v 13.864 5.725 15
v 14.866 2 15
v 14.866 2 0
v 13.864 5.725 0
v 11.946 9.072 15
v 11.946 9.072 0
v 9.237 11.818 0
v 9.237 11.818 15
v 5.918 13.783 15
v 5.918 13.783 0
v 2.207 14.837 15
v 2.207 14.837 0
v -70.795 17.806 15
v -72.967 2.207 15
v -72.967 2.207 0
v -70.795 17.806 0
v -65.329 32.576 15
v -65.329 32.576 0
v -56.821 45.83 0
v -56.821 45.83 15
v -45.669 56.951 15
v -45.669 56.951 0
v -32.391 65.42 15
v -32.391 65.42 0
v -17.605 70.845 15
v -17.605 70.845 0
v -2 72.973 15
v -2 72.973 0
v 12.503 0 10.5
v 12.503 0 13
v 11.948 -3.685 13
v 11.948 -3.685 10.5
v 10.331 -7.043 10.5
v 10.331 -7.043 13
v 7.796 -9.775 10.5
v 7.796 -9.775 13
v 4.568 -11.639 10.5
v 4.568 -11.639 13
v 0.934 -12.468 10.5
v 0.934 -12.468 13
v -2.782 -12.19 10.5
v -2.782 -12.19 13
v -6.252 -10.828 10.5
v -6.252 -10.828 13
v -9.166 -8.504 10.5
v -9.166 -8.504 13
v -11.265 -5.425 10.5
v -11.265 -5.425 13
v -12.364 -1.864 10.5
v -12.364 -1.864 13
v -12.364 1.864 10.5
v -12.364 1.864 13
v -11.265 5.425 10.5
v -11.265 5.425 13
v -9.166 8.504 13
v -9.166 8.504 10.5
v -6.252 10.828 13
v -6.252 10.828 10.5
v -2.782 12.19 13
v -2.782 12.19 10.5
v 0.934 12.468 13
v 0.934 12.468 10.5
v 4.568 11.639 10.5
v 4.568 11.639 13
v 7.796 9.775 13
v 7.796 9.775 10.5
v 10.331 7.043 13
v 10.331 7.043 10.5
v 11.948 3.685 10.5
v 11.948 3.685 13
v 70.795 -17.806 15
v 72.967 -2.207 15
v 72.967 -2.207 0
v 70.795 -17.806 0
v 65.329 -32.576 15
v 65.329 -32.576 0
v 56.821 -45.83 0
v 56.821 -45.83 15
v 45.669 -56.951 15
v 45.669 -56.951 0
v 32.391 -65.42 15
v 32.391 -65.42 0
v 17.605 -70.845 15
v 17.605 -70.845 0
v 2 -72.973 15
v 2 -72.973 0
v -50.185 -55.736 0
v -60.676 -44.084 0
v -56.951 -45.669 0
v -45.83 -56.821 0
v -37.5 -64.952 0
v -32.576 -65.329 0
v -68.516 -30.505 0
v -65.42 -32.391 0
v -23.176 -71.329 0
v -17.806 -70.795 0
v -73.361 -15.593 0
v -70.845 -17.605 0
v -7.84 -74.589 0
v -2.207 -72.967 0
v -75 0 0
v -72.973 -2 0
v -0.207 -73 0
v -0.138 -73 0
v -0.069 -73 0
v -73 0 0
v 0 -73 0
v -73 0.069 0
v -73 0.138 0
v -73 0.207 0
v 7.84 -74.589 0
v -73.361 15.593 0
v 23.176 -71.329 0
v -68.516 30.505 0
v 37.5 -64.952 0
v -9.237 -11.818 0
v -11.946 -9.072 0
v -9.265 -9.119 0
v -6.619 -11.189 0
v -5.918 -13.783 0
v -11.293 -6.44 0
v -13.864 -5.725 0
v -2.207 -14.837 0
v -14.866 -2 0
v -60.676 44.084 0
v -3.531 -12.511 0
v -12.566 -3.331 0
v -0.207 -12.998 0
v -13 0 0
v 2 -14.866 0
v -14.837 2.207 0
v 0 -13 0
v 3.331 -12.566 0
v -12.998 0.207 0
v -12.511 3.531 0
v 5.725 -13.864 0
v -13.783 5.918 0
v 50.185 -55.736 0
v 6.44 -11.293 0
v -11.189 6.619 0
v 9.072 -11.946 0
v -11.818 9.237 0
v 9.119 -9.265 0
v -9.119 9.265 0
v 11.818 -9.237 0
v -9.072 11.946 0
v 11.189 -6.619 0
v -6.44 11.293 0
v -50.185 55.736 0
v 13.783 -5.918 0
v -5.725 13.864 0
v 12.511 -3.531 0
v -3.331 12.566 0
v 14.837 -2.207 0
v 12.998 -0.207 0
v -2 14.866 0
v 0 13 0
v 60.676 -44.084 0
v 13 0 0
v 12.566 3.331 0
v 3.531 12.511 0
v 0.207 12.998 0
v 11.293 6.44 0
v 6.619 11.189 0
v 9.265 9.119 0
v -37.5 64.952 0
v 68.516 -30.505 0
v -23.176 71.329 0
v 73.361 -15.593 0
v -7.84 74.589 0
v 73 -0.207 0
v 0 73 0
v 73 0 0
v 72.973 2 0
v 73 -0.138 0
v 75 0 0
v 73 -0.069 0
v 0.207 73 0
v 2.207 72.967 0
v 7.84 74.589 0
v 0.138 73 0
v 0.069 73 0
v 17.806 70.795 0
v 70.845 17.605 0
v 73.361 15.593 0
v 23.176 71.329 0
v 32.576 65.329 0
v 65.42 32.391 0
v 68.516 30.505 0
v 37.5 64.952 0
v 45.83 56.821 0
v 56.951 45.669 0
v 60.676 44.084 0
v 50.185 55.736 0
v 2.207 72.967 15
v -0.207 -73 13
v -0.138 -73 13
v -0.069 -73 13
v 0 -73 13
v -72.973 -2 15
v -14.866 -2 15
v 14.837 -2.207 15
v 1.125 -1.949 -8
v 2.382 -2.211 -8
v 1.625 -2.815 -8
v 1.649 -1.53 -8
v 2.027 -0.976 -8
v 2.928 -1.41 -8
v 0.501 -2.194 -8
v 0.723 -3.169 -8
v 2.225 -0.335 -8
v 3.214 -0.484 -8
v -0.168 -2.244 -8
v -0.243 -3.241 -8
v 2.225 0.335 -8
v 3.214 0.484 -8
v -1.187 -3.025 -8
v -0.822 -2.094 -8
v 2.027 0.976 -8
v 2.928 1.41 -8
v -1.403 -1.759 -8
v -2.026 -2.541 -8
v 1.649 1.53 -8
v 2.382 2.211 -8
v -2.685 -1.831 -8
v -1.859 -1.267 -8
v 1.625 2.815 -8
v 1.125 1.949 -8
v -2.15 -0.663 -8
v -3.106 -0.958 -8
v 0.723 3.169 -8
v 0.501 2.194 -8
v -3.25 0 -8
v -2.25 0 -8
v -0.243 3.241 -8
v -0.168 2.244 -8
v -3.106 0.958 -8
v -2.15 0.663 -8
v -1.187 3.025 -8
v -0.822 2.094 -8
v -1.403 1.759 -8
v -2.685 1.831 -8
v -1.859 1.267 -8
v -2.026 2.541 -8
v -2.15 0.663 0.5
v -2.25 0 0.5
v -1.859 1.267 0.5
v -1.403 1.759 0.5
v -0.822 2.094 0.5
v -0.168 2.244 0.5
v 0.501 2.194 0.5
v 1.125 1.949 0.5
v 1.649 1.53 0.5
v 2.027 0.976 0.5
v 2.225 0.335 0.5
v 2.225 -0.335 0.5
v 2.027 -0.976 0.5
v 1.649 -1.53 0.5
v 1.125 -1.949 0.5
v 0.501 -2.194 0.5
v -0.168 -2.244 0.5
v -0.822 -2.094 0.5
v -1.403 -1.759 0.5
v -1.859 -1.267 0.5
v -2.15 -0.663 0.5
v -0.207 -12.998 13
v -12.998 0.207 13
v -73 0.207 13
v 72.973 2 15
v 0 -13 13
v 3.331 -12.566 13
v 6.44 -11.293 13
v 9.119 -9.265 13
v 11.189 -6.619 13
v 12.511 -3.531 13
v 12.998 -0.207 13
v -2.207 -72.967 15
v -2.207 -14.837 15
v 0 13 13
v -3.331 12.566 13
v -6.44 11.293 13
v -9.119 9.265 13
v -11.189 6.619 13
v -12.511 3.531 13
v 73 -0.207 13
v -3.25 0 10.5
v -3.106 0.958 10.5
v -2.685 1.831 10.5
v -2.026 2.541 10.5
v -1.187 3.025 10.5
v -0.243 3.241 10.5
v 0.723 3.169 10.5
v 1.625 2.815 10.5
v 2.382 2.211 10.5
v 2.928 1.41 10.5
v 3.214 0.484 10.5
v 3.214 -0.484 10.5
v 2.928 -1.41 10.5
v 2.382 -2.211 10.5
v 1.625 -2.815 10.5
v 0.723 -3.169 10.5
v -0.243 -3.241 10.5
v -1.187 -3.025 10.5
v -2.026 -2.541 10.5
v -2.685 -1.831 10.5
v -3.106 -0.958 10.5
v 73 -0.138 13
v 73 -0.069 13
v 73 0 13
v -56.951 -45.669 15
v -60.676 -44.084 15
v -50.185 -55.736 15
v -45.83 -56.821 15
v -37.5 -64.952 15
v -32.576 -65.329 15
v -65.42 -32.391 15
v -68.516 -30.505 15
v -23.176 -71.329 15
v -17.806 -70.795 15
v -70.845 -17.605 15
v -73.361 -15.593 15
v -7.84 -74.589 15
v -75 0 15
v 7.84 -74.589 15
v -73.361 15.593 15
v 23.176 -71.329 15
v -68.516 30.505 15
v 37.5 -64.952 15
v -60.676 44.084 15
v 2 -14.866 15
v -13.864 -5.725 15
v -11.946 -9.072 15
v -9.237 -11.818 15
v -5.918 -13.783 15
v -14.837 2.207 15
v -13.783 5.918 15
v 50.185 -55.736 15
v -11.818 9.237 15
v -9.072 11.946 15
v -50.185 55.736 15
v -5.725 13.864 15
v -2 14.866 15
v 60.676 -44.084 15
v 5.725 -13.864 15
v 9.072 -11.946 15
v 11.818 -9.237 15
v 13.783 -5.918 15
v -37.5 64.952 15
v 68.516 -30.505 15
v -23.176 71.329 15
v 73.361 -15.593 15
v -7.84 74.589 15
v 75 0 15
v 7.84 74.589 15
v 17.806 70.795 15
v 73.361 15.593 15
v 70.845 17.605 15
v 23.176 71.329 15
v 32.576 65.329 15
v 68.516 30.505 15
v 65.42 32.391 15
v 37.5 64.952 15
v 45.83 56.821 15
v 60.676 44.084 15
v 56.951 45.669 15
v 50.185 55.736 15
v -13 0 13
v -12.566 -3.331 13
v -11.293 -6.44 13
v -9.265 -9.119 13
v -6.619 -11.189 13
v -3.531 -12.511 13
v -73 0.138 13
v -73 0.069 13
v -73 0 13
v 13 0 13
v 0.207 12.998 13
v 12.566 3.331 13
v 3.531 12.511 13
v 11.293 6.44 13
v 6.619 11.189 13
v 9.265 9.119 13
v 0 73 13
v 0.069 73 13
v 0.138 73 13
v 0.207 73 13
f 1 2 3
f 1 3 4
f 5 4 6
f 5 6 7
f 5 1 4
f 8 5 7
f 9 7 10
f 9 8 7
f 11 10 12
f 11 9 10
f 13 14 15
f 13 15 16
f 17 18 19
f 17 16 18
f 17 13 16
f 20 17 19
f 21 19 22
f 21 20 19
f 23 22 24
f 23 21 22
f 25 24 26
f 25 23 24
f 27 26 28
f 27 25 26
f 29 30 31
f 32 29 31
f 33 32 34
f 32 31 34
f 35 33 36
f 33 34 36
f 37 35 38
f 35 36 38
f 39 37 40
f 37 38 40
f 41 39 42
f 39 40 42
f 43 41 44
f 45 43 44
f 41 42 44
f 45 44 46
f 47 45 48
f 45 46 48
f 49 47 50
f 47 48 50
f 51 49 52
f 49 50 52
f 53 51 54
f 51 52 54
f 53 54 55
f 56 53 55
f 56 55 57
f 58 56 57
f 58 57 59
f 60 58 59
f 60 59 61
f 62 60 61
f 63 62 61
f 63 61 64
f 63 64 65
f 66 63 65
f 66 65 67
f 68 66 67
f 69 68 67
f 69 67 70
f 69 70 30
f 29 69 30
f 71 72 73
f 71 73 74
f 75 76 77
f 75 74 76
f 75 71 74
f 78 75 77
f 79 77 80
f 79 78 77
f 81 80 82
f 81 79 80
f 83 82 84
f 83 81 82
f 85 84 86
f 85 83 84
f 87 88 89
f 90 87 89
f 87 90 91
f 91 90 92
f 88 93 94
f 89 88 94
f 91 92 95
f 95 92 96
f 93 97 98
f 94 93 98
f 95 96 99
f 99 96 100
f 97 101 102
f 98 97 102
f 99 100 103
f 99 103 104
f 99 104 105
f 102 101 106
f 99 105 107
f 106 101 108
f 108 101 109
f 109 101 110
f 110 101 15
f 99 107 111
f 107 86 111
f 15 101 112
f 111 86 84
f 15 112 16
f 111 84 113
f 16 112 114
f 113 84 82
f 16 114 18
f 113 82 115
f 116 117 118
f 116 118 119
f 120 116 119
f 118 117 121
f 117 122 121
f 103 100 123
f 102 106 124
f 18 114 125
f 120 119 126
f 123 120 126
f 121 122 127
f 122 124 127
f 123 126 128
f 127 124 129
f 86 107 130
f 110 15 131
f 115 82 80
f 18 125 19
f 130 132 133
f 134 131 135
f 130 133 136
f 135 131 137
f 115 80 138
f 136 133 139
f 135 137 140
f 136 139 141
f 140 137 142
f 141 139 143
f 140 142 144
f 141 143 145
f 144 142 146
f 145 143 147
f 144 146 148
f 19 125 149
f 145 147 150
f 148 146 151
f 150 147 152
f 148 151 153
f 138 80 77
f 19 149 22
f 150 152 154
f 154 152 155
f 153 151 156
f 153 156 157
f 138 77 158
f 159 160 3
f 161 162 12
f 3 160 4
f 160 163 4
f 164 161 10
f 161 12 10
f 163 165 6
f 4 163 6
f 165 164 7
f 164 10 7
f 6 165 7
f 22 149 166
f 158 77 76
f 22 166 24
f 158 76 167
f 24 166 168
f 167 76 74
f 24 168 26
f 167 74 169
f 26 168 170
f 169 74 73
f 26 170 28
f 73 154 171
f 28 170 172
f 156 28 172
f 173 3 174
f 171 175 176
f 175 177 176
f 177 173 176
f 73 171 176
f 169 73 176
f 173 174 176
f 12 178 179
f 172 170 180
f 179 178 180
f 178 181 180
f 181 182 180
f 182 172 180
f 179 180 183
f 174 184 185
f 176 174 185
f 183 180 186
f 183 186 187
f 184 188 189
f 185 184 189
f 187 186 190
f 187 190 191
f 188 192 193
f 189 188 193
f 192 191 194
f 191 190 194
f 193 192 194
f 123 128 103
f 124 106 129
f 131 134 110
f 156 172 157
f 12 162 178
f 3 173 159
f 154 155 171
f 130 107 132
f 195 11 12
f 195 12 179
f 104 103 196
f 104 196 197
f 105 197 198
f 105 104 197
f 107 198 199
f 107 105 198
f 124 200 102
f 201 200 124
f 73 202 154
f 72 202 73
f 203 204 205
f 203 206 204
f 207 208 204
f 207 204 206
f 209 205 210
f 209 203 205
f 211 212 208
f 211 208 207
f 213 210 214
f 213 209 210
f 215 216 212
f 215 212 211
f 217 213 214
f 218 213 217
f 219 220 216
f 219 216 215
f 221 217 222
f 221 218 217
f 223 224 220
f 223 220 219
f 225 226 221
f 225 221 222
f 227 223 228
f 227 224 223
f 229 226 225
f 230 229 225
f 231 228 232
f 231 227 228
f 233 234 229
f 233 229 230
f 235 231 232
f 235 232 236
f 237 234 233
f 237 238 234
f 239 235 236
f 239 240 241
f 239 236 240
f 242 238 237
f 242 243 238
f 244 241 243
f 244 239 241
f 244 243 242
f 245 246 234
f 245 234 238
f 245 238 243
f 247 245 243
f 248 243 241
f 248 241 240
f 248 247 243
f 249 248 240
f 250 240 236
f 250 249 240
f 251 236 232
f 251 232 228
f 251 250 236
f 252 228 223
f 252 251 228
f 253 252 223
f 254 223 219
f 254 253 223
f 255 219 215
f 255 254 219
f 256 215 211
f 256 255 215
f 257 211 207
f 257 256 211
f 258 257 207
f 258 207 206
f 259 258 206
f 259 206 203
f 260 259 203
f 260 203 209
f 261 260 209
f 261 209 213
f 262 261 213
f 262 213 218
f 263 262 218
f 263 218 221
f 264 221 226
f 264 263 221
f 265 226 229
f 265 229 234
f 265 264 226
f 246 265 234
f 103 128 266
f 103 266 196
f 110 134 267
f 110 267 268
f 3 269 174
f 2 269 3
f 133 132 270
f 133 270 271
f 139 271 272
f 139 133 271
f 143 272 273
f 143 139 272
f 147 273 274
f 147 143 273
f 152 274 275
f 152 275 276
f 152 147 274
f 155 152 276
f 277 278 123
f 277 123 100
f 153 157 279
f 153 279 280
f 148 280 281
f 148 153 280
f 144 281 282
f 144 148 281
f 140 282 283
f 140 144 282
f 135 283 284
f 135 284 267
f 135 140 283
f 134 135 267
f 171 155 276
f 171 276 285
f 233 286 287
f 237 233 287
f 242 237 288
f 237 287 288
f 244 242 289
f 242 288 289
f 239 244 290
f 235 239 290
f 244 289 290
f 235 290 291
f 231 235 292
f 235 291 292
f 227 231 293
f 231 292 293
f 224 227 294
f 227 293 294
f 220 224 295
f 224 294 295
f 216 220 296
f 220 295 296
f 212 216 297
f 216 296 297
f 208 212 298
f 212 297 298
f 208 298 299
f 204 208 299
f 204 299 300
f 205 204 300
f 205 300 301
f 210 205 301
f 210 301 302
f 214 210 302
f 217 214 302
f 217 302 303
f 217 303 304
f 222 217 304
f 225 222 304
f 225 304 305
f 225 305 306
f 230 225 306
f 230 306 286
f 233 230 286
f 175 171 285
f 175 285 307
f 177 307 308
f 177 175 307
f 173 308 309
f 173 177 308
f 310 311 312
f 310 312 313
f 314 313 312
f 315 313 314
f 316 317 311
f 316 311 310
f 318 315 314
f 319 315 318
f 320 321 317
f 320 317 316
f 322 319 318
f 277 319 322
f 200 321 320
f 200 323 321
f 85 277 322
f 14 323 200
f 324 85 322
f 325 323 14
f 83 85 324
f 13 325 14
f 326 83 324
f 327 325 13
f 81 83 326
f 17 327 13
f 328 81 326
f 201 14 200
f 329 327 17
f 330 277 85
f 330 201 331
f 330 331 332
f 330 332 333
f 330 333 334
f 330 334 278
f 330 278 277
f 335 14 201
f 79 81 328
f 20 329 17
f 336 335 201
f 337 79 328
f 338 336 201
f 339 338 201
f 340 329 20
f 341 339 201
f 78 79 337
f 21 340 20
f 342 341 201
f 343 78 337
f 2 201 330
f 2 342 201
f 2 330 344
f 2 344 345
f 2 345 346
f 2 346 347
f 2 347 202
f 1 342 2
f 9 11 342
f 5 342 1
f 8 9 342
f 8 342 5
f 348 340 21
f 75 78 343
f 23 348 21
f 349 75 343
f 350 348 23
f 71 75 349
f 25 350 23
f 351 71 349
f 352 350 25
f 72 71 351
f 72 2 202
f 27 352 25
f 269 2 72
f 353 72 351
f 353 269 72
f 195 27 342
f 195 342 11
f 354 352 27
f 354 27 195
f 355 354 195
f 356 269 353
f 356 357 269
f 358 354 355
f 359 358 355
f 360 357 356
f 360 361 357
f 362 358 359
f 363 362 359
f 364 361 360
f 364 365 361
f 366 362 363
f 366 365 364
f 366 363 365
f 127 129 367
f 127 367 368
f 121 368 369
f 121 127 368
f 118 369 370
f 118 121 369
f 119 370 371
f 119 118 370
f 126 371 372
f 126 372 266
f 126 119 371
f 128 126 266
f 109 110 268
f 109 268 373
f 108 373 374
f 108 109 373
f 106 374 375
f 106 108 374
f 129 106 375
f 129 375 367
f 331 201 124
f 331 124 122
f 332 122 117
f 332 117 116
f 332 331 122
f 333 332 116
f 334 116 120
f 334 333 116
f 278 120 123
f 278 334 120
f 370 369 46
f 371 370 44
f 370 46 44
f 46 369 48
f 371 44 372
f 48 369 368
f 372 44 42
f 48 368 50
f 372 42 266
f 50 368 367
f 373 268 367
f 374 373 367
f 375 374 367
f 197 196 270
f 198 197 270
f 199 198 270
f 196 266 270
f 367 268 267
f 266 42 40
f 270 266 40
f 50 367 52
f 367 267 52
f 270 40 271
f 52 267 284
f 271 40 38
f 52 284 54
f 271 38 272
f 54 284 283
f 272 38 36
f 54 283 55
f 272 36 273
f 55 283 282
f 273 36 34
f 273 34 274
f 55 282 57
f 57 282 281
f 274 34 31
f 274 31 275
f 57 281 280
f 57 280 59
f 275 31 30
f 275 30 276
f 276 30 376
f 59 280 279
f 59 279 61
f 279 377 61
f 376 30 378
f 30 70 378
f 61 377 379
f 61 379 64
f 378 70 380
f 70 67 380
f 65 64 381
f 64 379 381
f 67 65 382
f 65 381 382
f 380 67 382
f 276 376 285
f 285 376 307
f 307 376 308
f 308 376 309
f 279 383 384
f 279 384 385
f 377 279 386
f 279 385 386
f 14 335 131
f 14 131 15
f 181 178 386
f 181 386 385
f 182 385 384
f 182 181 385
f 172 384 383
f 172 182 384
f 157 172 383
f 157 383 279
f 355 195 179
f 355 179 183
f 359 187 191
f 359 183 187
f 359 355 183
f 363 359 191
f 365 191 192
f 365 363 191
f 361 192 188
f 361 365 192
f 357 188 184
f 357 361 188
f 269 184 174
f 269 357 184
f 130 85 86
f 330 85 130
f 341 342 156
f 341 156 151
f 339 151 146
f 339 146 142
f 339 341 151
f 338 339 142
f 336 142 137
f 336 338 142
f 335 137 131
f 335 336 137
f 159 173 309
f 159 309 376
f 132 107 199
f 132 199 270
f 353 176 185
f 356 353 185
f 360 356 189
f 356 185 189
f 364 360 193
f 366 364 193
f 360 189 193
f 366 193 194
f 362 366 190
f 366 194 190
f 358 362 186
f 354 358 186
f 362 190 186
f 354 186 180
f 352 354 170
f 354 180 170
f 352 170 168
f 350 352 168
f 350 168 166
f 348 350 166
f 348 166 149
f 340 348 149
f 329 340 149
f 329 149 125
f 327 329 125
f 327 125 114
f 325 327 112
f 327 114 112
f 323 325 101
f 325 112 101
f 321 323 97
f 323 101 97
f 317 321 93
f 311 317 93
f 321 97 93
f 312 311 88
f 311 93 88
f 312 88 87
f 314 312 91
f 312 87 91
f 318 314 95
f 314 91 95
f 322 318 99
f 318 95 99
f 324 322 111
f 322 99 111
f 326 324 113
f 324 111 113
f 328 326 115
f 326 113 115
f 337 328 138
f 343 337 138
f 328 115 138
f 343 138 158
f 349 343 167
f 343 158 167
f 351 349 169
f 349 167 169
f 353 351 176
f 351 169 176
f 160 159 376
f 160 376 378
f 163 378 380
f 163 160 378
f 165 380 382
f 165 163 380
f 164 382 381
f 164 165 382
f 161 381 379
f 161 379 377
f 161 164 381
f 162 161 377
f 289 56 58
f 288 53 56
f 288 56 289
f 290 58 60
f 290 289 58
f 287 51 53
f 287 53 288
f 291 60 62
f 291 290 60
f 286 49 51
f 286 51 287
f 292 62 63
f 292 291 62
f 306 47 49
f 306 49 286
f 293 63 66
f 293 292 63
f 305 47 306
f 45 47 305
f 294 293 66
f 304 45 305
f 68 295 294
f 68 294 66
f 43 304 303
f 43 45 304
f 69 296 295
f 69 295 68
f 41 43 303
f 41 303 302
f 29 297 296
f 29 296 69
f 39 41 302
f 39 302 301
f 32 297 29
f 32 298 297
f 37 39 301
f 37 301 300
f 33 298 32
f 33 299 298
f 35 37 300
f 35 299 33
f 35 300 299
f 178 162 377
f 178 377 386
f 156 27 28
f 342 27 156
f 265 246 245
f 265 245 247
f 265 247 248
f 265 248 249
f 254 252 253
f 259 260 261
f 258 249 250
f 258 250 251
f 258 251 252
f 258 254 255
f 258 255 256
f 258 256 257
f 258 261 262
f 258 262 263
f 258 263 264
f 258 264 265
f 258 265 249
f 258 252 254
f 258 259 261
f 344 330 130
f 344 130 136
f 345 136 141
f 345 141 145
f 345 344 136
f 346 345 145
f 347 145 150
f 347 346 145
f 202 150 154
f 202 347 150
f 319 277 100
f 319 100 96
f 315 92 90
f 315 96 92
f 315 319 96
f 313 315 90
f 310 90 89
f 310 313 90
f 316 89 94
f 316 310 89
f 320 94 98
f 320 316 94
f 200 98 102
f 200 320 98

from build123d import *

# Parameters (mm, degrees)
SKETCH4_R           = 75
BOSS_EXTRUDE2_DEPTH = 15
CUT_EXTRUDE1_DEPTH  = 108.121426428
CIRPATTERN1_COUNT   = 4
SHELL1_DEPTH        = 13
SKETCH7_R           = 12.503328754
BOSS_EXTRUDE3_DEPTH = 12.5
SKETCH8_R           = 3.25
SKETCH8_R_2         = 2.25
BOSS_EXTRUDE4_DEPTH = 8.5
CUT_EXTRUDE2_START  = -10
SKETCH9_R           = 12.503328754
SKETCH9_R_2         = 3.25
CUT_EXTRUDE2_DEPTH  = 10


# Read off the part's stored shape, not the designer's step: Shell1
with BuildPart() as part:
    # Sketch4 → Boss-Extrude2 (new body)
    with BuildSketch(Plane.XY):
        Circle(SKETCH4_R)
    extrude(amount=BOSS_EXTRUDE2_DEPTH)

    # Sketch6 → Cut-Extrude1 (cut, symmetric)
    with BuildSketch(Plane.XY):
        with BuildLine():
            Line((2.206615595, 15), (2.206615595, 69.72932719))
            Line((2.206615595, 69.72932719), (2.206615595, 72.96664202))
            ThreePointArc((2.206615595, 72.96664202), (51.691823279, 51.54566331), (72.972597597, 2))
            Line((72.972597597, 2), (15, 2))
            Line((15, 2), (14.866068747, 2))
            ThreePointArc((14.866068747, 2), (10.680123706, 10.532566526), (2.206615595, 14.836807191))
            Line((2.206615595, 14.836807191), (2.206615595, 15))
        make_face()
    cut_extrude1 = extrude(amount=CUT_EXTRUDE1_DEPTH, both=True, mode=Mode.SUBTRACT)

    # CirPattern1: Cut-Extrude1 ×4 about axis
    cirpattern1_axis = Axis((0, 0, 0), (0, 0, 1))
    for i in range(1, CIRPATTERN1_COUNT):
        add(cut_extrude1.rotate(cirpattern1_axis, i * 360 / CIRPATTERN1_COUNT), mode=Mode.SUBTRACT)

    # Shell1 outline → Shell1 (cut)
    with BuildSketch(Plane.XY):
        with BuildLine():
            ThreePointArc((-0.206615595, -72.999707602), (-0.103307901, -72.9999269), (0, -73))
            Line((0, -73), (0, -13))
            ThreePointArc((0, -13), (9.119045928, -9.26514983), (12.998357973, -0.206615595))
            Line((12.998357973, -0.206615595), (72.999707602, -0.206615595))
            ThreePointArc((72.999707602, -0.206615595), (72.9999269, -0.103307901), (73, 0))
            Line((73, 0), (13, 0))
            ThreePointArc((13, 0), (9.26514983, 9.119045928), (0.206615595, 12.998357973))
            Line((0.206615595, 12.998357973), (0.206615595, 72.999707602))
            ThreePointArc((0.206615595, 72.999707602), (0.103307901, 72.9999269), (0, 73))
            Line((0, 73), (0, 13))
            ThreePointArc((0, 13), (-9.119045928, 9.26514983), (-12.998357973, 0.206615595))
            Line((-12.998357973, 0.206615595), (-72.999707602, 0.206615595))
            ThreePointArc((-72.999707602, 0.206615595), (-72.9999269, 0.103307901), (-73, 0))
            Line((-73, 0), (-13, 0))
            ThreePointArc((-13, 0), (-9.26514983, -9.119045928), (-0.206615595, -12.998357973))
            Line((-0.206615595, -12.998357973), (-0.206615595, -72.999707602))
        make_face()
    extrude(amount=SHELL1_DEPTH, mode=Mode.SUBTRACT)

    # Sketch7 → Boss-Extrude3 (add)
    with BuildSketch(Plane(origin=(0, 0, 13), x_dir=(-1, 0, 0), z_dir=(0, 0, -1))):
        with Locations(Location((0, 0, 0), (0, 0, 180))):
            Circle(SKETCH7_R)
    extrude(amount=BOSS_EXTRUDE3_DEPTH)

    # Sketch8 → Boss-Extrude4 (add)
    with BuildSketch(Plane(origin=(0, 0, 0.5), x_dir=(-1, 0, 0), z_dir=(0, 0, -1))):
        Circle(SKETCH8_R)
        Circle(SKETCH8_R_2, mode=Mode.SUBTRACT)
    extrude(amount=BOSS_EXTRUDE4_DEPTH)

    # Sketch9 → Cut-Extrude2 (cut)
    with BuildSketch(Plane(origin=(0, 0, 0.5), x_dir=(-1, 0, 0), z_dir=(0, 0, -1)).offset(CUT_EXTRUDE2_START)):
        with Locations(Location((0, 0, 0), (0, 0, 180))):
            Circle(SKETCH9_R)
        Circle(SKETCH9_R_2, mode=Mode.SUBTRACT)
    extrude(amount=CUT_EXTRUDE2_DEPTH, mode=Mode.SUBTRACT)


solid = part.part
